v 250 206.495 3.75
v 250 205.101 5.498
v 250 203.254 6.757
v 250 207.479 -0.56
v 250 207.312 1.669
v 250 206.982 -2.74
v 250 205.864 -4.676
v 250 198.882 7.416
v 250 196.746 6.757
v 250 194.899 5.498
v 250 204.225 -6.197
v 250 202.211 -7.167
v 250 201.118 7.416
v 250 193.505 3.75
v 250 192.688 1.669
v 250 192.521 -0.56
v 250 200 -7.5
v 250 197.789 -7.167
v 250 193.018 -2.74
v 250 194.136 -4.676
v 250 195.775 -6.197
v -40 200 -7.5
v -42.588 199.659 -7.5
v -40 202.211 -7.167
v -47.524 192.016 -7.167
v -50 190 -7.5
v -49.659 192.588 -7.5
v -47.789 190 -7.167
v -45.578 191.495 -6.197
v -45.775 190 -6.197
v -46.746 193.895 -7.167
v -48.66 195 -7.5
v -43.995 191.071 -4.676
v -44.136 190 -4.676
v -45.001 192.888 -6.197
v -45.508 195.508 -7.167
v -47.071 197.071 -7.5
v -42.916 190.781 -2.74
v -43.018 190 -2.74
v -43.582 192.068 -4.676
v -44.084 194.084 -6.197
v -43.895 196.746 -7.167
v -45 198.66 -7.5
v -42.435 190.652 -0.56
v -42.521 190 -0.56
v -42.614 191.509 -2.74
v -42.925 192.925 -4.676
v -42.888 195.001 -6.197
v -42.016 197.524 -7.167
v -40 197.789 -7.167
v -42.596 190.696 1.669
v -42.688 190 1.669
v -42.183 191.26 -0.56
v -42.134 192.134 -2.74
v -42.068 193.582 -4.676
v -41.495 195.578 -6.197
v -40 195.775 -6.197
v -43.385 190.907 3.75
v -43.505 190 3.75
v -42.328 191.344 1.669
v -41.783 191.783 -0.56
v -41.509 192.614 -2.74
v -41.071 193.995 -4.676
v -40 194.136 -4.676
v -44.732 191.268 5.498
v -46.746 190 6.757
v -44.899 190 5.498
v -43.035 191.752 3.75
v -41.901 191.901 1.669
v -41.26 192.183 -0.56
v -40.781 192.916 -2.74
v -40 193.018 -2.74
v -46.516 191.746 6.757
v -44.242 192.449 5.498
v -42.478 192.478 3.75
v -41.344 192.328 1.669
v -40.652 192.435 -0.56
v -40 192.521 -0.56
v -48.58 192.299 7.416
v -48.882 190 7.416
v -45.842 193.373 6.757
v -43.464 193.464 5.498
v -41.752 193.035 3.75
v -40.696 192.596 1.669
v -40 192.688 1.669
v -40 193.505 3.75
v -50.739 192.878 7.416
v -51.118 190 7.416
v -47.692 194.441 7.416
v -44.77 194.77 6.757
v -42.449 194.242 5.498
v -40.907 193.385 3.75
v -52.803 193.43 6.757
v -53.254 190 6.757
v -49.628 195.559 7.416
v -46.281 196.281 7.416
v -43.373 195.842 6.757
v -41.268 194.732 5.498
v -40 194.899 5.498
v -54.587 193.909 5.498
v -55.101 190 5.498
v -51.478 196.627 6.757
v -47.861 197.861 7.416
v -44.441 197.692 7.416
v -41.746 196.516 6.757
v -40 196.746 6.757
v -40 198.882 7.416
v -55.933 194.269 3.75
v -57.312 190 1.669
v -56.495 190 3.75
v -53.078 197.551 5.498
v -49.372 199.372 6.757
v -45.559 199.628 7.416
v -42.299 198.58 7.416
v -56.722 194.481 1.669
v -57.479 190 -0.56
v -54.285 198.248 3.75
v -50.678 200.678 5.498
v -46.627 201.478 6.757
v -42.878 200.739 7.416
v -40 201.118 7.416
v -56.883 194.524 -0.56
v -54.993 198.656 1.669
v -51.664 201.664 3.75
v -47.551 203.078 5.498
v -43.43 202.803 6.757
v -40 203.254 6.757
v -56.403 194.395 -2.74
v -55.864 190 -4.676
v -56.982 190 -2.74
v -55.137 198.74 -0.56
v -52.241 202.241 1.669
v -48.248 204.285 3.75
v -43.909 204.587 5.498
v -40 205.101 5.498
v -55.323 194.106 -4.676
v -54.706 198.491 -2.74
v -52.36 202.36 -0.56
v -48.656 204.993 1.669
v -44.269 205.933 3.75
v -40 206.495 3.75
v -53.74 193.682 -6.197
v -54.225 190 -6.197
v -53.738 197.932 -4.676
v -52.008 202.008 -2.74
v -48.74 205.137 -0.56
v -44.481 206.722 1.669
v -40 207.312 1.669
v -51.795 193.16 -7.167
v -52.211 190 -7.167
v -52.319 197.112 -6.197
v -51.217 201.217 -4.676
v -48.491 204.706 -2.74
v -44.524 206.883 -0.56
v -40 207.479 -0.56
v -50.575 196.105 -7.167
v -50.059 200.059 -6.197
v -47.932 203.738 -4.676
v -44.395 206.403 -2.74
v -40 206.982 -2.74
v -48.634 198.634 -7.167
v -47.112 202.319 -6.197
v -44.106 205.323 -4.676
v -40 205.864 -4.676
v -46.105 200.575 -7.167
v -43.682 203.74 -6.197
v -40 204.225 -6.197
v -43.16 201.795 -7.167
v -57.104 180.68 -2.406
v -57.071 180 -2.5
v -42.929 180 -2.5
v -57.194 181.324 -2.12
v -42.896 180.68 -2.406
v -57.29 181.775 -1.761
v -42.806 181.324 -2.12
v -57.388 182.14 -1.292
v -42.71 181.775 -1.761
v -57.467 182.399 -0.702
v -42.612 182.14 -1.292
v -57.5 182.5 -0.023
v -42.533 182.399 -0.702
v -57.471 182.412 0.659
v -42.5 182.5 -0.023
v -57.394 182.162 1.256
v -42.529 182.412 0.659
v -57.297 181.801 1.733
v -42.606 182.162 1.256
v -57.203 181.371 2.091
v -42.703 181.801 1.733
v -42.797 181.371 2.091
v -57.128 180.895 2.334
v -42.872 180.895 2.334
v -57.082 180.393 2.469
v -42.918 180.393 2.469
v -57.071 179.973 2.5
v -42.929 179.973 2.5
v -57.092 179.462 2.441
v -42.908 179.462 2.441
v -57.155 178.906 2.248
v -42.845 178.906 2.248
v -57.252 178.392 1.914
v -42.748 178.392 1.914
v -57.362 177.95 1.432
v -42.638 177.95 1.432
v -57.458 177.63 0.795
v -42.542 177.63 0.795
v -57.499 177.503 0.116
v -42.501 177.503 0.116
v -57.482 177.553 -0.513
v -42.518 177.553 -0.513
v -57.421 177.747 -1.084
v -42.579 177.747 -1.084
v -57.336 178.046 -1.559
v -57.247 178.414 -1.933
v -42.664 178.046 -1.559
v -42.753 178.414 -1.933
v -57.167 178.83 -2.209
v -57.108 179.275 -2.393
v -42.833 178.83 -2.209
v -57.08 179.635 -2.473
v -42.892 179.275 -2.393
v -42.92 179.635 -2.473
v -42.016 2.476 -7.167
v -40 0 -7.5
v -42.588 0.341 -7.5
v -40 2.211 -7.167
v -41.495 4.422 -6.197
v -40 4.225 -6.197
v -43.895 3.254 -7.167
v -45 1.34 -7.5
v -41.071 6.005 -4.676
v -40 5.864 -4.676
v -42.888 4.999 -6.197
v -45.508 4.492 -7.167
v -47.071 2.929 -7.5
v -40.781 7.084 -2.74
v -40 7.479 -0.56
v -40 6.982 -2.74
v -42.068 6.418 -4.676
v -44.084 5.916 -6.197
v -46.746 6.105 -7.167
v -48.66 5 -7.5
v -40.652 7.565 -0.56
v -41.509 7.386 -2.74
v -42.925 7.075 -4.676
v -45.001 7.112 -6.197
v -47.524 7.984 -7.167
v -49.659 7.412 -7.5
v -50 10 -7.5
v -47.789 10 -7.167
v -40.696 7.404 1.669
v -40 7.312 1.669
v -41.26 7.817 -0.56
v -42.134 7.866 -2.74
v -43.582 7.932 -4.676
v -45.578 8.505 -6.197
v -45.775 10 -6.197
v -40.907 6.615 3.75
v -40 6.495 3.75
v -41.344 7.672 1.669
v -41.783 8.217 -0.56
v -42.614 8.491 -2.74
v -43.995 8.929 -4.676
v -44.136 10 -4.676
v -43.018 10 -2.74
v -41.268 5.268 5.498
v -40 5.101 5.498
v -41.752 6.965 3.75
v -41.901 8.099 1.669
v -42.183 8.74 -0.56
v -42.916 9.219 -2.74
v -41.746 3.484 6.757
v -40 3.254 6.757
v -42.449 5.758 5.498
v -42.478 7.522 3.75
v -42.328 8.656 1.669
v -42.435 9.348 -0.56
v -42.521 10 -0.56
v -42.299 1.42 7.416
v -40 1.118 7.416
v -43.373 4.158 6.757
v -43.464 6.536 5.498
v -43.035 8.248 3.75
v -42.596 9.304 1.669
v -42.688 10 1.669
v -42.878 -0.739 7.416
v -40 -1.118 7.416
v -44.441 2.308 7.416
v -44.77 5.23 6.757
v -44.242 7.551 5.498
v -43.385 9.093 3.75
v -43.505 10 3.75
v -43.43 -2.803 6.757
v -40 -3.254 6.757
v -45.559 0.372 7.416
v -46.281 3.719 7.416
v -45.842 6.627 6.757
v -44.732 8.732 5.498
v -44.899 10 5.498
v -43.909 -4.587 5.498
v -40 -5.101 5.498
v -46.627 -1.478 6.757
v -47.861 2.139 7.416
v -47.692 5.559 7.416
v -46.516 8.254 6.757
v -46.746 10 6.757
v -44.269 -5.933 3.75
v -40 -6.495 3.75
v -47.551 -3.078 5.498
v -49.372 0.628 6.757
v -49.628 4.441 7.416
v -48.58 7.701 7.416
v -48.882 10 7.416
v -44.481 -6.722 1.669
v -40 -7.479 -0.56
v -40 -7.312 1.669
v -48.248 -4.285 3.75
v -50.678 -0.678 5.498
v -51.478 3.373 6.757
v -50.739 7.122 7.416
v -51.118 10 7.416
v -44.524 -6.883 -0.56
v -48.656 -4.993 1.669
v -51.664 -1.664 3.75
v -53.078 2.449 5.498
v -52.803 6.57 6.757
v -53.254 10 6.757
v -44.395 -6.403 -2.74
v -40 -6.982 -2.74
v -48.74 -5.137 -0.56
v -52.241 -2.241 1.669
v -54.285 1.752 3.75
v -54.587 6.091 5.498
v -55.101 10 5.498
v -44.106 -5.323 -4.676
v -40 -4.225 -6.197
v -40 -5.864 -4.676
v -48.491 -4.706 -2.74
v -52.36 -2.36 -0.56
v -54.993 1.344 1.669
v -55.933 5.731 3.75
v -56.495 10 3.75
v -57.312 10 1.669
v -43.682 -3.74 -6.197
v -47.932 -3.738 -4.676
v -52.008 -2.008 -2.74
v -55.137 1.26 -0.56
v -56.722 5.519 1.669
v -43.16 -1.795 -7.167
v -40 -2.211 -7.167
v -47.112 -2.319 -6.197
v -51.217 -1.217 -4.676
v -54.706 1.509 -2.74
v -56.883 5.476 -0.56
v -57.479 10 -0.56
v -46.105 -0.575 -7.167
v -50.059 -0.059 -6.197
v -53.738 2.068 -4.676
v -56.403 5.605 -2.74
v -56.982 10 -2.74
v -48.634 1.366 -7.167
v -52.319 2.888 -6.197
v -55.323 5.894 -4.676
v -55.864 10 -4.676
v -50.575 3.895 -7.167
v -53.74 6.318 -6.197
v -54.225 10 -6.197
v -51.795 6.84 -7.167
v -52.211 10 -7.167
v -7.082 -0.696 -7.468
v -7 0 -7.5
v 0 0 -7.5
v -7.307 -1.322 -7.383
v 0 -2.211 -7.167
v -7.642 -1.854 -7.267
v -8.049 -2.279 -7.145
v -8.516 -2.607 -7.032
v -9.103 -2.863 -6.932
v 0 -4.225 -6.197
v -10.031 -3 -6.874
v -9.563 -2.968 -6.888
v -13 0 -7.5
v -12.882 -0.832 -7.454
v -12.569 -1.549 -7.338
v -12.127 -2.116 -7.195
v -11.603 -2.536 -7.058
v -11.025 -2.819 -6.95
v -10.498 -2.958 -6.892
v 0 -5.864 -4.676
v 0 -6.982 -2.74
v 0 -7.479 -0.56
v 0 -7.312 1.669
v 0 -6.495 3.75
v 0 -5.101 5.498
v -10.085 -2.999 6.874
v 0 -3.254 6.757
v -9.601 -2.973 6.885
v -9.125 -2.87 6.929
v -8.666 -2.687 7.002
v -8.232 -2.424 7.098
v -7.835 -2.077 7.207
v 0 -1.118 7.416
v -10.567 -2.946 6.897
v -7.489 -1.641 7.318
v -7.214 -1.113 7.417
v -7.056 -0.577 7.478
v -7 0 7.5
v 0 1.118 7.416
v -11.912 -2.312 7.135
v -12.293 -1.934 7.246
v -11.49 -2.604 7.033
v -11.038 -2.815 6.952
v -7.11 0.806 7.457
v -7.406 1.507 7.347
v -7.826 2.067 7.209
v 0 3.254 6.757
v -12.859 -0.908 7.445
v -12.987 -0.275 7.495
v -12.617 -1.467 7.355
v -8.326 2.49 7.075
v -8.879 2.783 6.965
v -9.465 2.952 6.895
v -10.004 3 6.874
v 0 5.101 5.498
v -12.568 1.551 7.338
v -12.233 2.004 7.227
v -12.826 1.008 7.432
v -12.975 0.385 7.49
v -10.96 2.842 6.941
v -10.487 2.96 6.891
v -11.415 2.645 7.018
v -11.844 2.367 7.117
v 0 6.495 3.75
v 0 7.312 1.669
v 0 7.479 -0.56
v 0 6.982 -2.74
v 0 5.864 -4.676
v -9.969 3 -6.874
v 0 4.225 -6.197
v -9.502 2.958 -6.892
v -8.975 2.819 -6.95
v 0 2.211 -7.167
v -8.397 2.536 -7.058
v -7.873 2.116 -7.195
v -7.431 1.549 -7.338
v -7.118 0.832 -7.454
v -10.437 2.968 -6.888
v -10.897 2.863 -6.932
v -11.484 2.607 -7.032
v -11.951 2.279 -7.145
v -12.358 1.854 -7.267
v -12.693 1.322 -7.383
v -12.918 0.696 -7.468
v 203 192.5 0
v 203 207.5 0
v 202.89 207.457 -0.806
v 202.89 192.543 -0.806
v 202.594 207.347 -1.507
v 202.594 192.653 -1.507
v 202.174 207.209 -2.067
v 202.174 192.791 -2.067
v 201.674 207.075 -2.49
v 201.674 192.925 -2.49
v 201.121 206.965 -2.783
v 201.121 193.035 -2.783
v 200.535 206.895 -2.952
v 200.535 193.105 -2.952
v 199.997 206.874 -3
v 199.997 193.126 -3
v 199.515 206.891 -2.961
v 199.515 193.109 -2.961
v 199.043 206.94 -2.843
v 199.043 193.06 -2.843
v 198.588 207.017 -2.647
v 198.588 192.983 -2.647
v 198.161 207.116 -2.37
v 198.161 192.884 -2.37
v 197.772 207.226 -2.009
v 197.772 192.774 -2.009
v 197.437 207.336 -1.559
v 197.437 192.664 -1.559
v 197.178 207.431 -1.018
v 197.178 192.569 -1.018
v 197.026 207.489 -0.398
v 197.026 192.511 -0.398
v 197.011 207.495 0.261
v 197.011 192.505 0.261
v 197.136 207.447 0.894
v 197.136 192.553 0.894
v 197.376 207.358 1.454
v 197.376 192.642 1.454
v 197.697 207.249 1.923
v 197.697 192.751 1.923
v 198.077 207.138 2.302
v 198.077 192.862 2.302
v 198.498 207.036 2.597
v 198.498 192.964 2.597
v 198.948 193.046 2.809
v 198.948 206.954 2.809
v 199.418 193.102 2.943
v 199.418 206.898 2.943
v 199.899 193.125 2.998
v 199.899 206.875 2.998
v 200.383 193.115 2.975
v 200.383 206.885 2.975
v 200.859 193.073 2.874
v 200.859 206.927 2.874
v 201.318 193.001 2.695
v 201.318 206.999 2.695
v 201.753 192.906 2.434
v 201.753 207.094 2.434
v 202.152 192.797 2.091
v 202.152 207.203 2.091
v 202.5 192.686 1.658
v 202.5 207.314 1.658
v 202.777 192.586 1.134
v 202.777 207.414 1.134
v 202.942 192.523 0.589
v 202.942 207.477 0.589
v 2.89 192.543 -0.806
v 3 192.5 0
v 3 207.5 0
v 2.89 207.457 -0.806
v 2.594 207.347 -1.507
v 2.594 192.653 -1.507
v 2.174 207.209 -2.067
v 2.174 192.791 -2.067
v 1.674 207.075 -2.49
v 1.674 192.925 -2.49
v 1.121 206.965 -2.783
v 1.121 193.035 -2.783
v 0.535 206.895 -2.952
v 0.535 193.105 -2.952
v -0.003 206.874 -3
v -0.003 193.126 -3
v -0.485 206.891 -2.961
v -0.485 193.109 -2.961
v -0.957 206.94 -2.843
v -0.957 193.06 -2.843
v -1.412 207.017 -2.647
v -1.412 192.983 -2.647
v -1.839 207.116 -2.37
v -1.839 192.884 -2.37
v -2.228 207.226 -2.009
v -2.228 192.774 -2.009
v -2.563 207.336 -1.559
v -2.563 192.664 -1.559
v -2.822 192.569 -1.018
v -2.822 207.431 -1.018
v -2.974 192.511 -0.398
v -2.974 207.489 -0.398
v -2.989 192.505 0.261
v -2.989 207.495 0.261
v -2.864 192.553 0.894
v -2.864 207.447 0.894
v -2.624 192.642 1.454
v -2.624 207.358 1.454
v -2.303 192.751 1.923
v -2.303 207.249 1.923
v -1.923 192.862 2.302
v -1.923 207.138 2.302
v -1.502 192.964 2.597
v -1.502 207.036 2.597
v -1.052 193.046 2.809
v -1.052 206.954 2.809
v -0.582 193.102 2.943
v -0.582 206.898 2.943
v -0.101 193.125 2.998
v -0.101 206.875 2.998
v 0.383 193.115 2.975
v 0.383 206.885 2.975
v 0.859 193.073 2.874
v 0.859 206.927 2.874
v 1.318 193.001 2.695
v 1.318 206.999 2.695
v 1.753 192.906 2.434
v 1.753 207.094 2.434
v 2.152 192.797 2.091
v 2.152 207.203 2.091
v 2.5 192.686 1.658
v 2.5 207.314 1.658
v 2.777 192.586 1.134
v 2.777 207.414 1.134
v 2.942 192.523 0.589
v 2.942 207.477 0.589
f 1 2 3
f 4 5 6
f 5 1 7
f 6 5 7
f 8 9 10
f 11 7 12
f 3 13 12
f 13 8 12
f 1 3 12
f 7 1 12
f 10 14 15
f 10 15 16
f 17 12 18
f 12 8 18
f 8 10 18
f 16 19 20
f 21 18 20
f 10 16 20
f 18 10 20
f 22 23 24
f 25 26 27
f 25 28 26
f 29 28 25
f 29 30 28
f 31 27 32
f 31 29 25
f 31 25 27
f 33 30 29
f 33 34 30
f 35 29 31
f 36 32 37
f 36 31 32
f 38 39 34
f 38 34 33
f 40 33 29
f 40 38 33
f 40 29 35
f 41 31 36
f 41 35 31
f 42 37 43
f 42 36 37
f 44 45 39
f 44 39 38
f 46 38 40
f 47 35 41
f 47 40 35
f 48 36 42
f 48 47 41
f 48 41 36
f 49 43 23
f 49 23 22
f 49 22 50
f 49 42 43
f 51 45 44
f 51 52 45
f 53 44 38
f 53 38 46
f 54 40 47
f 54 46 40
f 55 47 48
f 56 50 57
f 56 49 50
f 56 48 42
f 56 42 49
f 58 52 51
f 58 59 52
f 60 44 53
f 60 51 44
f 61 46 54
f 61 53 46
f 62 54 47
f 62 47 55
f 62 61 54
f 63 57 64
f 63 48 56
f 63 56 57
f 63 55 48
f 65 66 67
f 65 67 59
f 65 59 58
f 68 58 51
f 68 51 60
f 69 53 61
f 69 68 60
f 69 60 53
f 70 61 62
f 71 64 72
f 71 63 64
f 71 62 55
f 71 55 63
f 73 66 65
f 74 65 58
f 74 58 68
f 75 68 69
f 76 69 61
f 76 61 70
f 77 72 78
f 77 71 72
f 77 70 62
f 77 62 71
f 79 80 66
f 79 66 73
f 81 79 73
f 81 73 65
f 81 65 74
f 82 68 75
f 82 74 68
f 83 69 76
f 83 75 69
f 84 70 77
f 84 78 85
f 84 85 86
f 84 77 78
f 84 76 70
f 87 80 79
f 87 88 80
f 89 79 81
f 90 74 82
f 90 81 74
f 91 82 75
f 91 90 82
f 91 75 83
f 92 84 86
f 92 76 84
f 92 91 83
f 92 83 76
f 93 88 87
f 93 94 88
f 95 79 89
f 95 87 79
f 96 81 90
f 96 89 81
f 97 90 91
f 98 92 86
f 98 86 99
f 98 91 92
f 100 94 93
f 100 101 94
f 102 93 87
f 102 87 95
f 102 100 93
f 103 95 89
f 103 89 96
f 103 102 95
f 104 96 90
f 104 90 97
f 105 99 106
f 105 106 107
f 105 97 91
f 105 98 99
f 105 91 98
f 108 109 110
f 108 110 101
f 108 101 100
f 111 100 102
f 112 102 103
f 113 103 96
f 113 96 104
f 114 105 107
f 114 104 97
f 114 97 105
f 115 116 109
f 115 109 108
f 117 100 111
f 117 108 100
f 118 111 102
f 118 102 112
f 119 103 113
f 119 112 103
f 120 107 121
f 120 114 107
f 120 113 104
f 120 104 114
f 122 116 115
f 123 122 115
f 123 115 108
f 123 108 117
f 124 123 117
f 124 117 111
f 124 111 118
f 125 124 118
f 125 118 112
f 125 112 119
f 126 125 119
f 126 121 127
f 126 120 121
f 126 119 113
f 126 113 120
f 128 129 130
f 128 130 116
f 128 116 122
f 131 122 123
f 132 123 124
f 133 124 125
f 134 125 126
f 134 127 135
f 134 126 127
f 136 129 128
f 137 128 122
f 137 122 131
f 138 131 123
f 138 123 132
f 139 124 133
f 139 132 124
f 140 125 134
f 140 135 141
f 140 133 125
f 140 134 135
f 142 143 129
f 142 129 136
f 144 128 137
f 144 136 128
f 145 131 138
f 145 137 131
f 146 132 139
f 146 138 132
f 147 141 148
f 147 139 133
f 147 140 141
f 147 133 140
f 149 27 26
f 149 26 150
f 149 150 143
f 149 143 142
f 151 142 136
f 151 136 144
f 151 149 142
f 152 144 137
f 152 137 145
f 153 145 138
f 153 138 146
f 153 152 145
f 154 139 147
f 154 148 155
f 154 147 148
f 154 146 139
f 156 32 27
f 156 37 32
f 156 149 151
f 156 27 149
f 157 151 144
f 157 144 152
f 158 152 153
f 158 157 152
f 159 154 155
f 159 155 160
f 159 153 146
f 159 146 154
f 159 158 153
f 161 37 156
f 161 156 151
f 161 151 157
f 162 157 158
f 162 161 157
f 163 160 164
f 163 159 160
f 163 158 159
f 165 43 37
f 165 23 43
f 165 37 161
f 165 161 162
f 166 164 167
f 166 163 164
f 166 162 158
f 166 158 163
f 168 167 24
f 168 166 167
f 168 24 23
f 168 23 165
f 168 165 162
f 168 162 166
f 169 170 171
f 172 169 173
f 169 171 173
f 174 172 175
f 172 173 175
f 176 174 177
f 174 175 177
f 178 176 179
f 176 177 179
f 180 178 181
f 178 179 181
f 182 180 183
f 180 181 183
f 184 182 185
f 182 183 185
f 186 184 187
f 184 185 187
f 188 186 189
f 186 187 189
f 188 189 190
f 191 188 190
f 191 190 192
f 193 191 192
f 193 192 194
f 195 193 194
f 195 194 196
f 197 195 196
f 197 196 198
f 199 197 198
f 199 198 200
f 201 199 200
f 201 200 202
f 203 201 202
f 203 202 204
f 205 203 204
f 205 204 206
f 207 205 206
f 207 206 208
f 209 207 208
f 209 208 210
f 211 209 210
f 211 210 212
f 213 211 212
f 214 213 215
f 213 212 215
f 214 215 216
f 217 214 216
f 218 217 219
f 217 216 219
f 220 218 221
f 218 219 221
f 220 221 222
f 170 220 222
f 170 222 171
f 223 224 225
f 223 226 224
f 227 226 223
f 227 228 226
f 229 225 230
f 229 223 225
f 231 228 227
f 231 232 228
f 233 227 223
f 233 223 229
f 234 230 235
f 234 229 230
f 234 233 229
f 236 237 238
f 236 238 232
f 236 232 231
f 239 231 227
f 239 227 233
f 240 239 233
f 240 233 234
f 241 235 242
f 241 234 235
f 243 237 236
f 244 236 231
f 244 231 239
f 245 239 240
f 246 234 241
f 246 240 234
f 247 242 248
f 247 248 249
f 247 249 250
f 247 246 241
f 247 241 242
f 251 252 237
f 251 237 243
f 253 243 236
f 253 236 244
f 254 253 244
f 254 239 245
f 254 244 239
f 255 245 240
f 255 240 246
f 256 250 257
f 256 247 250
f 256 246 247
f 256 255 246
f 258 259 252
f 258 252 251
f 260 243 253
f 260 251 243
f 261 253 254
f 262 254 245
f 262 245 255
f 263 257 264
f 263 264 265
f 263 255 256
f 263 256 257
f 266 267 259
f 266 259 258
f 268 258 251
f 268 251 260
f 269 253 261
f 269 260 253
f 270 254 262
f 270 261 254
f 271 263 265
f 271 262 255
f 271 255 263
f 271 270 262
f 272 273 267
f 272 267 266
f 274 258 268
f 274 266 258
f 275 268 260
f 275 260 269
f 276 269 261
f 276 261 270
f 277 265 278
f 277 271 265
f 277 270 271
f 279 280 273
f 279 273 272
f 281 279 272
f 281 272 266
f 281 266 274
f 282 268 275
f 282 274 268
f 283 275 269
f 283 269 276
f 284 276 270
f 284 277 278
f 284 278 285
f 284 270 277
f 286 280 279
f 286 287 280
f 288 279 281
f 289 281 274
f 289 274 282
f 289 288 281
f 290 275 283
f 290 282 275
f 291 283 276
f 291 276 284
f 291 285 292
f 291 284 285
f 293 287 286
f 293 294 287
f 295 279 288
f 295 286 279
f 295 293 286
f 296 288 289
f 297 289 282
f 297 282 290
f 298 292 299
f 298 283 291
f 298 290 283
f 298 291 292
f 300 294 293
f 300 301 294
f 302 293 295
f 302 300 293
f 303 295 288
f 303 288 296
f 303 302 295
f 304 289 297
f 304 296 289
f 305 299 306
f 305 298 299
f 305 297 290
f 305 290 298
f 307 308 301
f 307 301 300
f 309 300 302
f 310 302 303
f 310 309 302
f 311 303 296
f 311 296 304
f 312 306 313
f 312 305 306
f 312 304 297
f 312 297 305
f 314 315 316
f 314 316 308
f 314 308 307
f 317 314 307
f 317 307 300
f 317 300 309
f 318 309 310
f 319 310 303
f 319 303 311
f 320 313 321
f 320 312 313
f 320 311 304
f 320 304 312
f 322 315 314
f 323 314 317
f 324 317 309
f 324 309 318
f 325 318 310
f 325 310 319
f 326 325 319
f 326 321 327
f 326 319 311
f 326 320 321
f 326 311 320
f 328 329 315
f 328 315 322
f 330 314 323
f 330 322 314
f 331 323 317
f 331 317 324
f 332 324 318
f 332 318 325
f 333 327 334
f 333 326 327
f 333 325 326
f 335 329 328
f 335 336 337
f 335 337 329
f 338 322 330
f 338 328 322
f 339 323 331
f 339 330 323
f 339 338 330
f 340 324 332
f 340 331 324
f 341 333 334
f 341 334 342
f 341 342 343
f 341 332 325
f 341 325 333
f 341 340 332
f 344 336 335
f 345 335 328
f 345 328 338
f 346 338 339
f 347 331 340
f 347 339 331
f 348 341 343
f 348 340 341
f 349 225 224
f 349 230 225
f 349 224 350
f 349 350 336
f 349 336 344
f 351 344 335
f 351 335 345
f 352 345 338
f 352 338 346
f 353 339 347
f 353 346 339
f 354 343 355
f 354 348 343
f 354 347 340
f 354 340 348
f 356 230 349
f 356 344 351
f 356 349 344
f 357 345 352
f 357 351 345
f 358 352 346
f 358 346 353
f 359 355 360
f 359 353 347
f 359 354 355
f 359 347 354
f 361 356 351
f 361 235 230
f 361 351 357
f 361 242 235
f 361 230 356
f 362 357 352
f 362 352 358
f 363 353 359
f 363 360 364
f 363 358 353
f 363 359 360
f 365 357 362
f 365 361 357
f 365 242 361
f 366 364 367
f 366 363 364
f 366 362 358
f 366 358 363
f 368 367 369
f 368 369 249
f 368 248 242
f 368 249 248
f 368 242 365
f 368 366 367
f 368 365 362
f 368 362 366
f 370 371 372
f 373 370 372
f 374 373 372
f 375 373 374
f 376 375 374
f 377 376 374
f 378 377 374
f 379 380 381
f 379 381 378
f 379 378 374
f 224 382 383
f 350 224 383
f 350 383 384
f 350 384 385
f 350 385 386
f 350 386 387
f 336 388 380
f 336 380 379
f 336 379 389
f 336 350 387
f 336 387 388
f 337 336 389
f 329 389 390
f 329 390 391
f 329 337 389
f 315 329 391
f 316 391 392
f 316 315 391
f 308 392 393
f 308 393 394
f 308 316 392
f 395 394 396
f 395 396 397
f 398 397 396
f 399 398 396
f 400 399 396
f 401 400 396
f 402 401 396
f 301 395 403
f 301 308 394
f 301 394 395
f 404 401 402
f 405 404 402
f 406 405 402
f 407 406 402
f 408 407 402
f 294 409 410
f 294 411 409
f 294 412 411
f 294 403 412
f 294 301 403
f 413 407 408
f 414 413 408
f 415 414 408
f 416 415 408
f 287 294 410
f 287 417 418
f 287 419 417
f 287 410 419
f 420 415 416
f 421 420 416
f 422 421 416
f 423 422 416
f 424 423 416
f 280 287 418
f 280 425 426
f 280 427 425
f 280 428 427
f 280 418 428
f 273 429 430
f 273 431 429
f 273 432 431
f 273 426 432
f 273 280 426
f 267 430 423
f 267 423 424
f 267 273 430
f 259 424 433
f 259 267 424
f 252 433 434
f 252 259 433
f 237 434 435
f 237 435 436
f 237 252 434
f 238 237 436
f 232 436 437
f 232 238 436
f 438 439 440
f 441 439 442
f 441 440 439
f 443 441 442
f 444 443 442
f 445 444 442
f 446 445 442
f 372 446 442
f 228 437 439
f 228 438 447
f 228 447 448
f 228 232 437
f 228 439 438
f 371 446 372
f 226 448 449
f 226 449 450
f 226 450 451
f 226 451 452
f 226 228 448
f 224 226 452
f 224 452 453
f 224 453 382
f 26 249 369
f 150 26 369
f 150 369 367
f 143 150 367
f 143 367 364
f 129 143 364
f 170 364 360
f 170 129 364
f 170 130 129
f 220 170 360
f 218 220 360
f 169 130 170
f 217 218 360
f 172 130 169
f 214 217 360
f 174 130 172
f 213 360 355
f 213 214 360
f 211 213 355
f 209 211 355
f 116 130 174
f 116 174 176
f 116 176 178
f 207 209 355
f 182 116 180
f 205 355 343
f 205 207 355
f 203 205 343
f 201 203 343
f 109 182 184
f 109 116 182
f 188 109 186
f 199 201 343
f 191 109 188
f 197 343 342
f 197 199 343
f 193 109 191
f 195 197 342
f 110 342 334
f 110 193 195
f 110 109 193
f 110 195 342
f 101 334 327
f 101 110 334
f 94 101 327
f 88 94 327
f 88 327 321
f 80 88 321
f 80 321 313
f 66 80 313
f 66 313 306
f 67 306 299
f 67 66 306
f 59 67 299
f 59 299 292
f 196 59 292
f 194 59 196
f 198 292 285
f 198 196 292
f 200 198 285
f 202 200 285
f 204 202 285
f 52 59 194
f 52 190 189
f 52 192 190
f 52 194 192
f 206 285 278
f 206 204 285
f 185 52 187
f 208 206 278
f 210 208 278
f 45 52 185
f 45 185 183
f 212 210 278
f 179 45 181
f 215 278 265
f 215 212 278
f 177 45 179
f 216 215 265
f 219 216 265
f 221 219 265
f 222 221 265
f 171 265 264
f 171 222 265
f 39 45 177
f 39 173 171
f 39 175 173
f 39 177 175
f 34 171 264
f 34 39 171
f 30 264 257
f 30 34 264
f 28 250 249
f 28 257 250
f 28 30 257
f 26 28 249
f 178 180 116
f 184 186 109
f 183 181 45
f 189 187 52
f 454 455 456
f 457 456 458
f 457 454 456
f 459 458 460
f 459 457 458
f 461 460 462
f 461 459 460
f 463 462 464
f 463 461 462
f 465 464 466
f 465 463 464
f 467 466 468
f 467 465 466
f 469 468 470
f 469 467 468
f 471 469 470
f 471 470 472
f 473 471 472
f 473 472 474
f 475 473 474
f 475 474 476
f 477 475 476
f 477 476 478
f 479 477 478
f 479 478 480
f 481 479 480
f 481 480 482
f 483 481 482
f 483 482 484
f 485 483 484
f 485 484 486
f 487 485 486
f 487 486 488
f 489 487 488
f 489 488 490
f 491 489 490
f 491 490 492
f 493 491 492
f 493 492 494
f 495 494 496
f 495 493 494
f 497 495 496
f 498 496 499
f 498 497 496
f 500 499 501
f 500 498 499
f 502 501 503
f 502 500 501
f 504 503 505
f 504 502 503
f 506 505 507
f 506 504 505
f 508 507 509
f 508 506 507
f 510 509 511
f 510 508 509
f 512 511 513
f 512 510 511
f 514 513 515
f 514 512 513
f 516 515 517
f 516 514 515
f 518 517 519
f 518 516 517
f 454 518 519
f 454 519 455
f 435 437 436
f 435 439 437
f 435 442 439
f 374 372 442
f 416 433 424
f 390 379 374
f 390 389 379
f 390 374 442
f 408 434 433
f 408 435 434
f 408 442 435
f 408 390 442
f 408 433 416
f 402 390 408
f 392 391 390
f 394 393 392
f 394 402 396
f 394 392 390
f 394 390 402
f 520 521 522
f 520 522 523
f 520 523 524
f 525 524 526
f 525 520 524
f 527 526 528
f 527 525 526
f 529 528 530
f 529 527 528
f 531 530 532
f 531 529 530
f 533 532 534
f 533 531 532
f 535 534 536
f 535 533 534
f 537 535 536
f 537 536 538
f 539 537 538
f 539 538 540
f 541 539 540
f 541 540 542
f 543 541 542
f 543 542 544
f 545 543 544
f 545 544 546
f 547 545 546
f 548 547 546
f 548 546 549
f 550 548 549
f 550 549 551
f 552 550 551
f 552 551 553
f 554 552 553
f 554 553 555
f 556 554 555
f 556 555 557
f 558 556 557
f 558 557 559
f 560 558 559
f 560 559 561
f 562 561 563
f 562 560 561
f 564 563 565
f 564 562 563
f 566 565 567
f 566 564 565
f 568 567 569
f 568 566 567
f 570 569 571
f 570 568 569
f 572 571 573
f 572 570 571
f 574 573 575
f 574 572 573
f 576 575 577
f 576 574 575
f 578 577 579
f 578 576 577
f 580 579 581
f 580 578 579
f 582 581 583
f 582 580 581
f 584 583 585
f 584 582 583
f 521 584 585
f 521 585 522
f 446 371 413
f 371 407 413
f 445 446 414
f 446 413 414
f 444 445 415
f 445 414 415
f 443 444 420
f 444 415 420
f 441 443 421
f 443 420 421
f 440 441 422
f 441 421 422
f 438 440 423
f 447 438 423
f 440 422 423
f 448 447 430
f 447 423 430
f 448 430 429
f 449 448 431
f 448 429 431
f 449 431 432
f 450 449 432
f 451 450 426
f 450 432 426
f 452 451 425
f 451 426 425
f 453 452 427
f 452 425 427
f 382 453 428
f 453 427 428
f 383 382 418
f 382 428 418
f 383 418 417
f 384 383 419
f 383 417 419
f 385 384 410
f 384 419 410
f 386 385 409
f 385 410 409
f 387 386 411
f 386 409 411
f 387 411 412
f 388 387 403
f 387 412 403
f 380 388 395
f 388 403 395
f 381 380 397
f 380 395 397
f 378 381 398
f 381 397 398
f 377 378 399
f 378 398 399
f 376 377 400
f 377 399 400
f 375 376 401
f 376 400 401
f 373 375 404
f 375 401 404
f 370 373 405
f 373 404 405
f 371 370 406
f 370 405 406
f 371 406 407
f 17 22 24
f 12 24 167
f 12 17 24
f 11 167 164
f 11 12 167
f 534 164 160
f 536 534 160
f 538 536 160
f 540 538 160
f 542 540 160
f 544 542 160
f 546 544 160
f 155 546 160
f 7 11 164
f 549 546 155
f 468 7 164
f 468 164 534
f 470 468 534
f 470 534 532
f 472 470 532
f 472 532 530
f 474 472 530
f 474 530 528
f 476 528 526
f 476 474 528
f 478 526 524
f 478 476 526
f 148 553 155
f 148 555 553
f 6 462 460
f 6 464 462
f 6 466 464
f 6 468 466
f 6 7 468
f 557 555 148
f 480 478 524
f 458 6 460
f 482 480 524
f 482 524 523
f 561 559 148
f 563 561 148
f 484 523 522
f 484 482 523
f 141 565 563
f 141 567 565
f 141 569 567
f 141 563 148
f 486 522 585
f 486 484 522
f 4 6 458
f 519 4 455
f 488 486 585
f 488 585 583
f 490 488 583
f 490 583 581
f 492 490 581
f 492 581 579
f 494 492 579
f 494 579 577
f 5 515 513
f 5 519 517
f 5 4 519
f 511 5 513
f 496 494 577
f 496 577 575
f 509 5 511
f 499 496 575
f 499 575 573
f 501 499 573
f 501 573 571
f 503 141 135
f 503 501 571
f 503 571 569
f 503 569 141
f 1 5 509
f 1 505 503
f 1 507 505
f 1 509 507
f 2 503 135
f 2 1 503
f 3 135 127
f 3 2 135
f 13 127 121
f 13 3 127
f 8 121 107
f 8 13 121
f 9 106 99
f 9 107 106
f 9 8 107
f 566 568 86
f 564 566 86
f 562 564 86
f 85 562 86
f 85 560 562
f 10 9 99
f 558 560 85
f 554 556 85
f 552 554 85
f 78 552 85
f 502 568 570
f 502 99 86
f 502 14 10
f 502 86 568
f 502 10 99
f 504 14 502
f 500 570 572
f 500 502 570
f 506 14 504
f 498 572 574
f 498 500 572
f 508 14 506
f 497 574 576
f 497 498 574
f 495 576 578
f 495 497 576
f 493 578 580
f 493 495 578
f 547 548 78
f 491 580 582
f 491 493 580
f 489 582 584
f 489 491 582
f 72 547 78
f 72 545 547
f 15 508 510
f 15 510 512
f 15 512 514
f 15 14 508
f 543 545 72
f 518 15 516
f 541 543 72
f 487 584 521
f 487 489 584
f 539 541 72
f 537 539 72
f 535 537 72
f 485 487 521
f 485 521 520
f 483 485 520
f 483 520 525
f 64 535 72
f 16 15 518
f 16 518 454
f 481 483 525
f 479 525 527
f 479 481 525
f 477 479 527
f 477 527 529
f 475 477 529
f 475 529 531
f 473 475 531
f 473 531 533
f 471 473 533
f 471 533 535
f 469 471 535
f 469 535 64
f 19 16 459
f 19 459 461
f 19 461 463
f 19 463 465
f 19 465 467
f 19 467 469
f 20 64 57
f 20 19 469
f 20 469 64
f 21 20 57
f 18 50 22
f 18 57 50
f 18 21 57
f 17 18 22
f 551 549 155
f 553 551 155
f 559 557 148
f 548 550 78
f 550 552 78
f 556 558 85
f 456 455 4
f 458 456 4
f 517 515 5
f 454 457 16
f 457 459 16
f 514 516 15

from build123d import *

# Parameters (mm, degrees)
SKETCH_2_R               = 7.5
CUT_EXTRUDE_1_DEPTH      = 10
CUT_EXTRUDE_1_DEPTH_BACK = 10
SKETCH_3_R               = 3
SKETCH_4_R               = 3
CUT_EXTRUDE_2_DEPTH      = 175
SKETCH_5_R               = 2.5
CUT_EXTRUDE_3_DEPTH      = 325.980768805


with BuildPart() as part:
    # 扫描1: sweep along a path in 草图1
    with BuildLine(Plane.XY) as sweep_1_path:
        Line((0, 0), (-40, 0))
        ThreePointArc((-40, 0), (-47.071067812, 2.928932188), (-50, 10))
        Line((-50, 10), (-50, 190))
        ThreePointArc((-50, 190), (-47.071067812, 197.071067812), (-40, 200))
        Line((-40, 200), (250, 200))
    # 草图2 → 扫描1 (sweep)
    with BuildSketch(Plane(origin=(0, 0, 0), x_dir=(0, 0, -1), z_dir=(1, 0, 0))):
        Circle(SKETCH_2_R)
    sweep(path=sweep_1_path.line)

    # 草图3 → 切除-拉伸1 (cut, two sides: drawn at the far end of the back side and taken through both)
    with BuildSketch(Plane.XY.offset(-CUT_EXTRUDE_1_DEPTH_BACK)):
        with Locations((-10, 0)):
            Circle(SKETCH_3_R)
    extrude(amount=CUT_EXTRUDE_1_DEPTH + CUT_EXTRUDE_1_DEPTH_BACK, mode=Mode.SUBTRACT)

    # 草图4 → 切除-拉伸2 (cut)
    with BuildSketch(Plane(origin=(0, 50, 0), x_dir=(1, 0, 0), z_dir=(0, 1, 0))):
        with Locations((200, 0)):
            Circle(SKETCH_4_R)
        Circle(SKETCH_4_R)
    extrude(amount=CUT_EXTRUDE_2_DEPTH, mode=Mode.SUBTRACT)

    # 草图5 → 切除-拉伸3 (cut, through all)
    with BuildSketch(Plane(origin=(0, 0, 0), x_dir=(0, 0, -1), z_dir=(1, 0, 0))):
        with Locations((0, 180)):
            Circle(SKETCH_5_R)
    extrude(amount=-CUT_EXTRUDE_3_DEPTH, mode=Mode.SUBTRACT)


solid = part.part
